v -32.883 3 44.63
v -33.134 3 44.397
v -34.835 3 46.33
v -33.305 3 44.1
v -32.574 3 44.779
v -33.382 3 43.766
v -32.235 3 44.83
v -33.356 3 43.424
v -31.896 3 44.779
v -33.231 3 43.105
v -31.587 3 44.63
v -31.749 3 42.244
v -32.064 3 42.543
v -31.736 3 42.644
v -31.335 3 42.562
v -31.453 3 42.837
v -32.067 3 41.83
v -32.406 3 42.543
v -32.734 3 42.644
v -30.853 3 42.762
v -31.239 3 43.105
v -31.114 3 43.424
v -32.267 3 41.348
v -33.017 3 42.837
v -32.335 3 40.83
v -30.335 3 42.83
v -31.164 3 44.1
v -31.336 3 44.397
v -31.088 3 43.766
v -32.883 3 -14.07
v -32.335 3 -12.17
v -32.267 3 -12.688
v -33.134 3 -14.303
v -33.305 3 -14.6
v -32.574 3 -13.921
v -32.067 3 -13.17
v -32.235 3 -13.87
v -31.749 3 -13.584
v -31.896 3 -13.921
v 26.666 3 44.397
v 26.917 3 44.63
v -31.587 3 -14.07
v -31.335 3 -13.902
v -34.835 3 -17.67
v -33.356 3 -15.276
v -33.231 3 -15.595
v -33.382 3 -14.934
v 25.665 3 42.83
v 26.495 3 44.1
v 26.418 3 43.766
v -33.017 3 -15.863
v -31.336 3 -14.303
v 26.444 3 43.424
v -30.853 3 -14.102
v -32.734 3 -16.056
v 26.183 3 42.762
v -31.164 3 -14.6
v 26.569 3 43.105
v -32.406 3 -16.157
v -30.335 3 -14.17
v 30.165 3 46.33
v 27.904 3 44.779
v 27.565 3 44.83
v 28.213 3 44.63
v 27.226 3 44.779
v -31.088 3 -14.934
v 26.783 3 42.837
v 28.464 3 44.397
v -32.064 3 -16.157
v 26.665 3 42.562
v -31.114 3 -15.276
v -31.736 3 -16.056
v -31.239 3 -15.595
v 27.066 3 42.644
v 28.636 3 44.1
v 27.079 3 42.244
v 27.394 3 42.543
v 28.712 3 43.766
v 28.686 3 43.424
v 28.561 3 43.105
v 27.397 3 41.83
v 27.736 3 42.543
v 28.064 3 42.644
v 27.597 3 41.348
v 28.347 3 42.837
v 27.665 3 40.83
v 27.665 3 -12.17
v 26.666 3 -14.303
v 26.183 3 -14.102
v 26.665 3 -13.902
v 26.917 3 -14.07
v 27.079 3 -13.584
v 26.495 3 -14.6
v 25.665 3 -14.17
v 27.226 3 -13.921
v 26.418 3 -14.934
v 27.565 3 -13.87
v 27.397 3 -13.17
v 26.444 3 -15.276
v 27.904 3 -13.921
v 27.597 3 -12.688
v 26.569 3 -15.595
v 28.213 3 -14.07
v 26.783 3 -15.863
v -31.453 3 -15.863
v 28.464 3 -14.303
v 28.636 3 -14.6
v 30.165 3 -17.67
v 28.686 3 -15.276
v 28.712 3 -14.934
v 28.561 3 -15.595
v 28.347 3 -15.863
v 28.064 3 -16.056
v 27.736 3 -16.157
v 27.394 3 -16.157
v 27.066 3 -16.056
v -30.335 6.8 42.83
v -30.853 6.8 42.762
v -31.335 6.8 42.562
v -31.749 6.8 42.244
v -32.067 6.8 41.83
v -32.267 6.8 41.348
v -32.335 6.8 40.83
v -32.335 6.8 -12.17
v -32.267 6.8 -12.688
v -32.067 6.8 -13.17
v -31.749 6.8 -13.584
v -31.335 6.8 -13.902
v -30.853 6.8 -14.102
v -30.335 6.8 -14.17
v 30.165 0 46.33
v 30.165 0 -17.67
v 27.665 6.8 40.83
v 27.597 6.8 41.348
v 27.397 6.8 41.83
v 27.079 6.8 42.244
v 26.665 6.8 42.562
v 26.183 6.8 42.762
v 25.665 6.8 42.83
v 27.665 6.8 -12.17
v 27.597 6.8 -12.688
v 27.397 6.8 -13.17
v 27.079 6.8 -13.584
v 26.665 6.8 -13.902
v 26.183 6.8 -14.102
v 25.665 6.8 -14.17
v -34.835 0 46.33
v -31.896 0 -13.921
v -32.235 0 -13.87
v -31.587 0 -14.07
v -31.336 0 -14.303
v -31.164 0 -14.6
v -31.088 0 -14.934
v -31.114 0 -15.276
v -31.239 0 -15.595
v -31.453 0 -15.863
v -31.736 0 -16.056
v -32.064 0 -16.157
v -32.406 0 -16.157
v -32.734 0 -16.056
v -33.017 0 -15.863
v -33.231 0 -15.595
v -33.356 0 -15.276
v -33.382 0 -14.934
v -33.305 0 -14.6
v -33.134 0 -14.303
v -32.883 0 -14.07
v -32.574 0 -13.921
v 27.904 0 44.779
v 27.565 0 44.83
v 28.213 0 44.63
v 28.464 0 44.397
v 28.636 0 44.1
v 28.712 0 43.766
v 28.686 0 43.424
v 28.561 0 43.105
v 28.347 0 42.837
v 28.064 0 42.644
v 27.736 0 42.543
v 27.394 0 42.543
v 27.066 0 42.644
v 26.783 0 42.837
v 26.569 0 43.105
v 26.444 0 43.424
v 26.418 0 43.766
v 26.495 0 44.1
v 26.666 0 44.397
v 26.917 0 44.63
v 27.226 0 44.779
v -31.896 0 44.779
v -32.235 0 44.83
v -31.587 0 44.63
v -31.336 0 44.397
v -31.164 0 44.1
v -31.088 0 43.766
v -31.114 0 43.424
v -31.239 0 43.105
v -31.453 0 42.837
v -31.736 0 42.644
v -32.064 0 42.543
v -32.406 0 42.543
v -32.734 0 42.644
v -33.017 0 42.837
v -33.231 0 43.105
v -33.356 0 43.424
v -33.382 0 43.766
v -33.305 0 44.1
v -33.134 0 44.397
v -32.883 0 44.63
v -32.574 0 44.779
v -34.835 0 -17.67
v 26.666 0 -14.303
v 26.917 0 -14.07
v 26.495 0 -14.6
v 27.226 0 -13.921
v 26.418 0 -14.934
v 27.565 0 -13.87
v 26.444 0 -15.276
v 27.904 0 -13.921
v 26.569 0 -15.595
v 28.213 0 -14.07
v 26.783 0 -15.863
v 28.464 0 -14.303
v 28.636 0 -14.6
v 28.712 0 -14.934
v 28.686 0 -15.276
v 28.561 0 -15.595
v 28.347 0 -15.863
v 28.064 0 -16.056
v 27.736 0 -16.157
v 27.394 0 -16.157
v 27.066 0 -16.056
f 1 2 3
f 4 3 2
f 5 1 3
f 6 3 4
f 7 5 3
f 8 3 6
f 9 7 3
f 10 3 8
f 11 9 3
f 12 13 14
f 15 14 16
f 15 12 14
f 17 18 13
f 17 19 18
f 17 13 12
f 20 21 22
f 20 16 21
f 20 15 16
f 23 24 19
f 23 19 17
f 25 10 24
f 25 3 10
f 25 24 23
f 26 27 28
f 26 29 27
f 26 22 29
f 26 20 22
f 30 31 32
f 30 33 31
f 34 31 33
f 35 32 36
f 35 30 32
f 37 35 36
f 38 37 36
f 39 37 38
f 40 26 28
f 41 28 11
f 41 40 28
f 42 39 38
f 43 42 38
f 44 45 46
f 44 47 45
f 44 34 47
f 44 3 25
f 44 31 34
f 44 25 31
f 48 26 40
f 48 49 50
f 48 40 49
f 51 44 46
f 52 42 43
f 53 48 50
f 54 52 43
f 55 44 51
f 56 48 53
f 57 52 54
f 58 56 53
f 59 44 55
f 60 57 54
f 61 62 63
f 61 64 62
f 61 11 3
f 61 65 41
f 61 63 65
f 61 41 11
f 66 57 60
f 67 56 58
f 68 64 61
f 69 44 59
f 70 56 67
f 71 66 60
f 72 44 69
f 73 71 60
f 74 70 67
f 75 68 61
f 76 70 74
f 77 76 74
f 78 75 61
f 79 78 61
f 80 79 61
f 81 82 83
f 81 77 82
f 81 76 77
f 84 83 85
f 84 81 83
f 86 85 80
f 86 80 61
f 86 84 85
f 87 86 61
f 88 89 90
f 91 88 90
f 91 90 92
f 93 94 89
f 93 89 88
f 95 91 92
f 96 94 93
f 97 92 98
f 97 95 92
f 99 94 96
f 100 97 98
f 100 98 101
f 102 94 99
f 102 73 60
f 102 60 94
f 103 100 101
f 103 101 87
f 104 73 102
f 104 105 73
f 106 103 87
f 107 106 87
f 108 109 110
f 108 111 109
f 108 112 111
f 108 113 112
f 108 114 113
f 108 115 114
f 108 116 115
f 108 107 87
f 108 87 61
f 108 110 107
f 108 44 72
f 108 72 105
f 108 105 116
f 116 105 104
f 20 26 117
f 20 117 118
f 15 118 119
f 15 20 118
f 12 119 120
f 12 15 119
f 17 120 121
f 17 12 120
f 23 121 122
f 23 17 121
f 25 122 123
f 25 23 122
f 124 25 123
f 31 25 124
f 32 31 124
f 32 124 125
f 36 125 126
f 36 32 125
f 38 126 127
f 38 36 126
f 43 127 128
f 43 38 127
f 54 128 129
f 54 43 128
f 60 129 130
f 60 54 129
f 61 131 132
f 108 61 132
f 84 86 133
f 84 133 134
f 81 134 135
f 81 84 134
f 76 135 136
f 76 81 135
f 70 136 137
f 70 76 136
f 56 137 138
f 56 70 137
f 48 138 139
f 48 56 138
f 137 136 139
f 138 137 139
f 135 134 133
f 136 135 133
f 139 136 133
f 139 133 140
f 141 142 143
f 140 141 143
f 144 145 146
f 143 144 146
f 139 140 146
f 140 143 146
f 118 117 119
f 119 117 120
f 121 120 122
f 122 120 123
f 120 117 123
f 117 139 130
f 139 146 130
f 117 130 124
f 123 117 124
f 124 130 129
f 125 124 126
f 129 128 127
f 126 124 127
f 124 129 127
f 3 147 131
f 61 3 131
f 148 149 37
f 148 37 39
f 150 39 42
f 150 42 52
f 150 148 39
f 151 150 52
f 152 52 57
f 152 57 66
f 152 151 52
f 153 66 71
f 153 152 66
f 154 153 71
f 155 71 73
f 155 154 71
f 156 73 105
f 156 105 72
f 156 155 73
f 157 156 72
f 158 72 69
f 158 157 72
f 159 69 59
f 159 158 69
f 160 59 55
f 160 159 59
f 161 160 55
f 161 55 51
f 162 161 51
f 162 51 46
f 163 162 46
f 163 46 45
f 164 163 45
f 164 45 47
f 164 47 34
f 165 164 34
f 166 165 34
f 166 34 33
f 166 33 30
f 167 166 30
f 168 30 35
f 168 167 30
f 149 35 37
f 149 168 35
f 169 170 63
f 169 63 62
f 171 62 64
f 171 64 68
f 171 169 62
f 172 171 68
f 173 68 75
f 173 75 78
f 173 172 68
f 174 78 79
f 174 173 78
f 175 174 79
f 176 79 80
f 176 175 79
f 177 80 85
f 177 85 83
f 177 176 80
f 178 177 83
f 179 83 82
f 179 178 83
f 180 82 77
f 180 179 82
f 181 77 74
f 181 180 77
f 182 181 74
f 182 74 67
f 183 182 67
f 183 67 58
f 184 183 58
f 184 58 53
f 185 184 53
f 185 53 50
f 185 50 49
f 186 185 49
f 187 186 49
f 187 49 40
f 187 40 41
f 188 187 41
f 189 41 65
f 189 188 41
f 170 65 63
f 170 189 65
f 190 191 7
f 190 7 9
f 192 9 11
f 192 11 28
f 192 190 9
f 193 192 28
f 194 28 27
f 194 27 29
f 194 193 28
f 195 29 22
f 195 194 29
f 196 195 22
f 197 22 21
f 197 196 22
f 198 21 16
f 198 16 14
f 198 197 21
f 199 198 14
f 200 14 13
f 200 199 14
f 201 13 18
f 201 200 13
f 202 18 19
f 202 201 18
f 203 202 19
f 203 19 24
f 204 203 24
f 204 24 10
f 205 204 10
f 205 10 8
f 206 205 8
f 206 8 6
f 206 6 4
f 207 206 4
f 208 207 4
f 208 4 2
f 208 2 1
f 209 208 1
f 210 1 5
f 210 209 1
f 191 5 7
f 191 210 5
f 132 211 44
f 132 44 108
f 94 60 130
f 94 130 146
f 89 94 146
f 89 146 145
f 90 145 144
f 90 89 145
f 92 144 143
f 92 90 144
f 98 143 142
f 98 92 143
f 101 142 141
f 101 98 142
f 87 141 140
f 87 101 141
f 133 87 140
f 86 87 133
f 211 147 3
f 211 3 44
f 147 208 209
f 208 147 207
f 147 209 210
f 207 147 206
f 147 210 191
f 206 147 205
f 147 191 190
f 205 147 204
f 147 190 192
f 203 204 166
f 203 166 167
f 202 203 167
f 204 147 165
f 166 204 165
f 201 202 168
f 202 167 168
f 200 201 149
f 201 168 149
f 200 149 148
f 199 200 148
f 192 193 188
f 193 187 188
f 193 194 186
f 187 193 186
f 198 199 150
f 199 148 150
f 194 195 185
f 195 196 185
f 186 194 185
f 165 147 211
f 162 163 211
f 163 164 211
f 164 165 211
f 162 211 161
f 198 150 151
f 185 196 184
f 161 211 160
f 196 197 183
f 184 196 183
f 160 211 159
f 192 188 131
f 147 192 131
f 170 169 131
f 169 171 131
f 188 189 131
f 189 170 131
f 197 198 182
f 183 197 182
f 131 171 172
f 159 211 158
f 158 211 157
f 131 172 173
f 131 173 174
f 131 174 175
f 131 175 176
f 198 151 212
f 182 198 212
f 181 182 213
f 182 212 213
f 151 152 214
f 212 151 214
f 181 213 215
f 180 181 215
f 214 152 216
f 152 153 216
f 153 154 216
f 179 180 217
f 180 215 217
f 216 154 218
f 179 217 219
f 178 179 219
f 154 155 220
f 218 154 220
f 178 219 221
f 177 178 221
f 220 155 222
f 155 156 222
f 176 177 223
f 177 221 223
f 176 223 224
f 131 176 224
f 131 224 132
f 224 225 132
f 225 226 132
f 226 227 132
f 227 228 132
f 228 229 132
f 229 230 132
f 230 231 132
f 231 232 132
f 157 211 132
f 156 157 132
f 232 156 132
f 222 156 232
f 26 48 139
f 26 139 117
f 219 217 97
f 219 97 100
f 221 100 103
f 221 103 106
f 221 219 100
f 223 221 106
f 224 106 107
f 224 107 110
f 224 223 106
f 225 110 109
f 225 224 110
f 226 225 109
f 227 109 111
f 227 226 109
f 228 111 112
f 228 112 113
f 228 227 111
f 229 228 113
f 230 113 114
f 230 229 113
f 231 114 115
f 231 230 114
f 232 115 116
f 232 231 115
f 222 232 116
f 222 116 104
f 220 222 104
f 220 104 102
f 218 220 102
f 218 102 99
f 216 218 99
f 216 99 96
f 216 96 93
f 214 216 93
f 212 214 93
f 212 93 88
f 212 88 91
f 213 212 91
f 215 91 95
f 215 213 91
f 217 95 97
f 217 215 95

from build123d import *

# Parameters (mm, degrees)
SKETCH1_W           = 65
SKETCH1_H           = 64
SKETCH1_R           = 1.15
BOSS_EXTRUDE1_DEPTH = 3
BOSS_EXTRUDE2_DEPTH = 3.8


with BuildPart() as part:
    # Sketch1 → Boss-Extrude1 (new body)
    with BuildSketch(Plane(origin=(0, 0, 0), x_dir=(1, 0, 0), z_dir=(0, 1, 0))):
        with Locations((-2.334951456, -14.330097087)):
            Rectangle(SKETCH1_W, SKETCH1_H)
        with Locations(Location((-32.234951456, 15.019902913, 0), (0, 0, 270))):
            Circle(SKETCH1_R, mode=Mode.SUBTRACT)
        with Locations(Location((27.565048544, 15.019902913, 0), (0, 0, 270))):
            Circle(SKETCH1_R, mode=Mode.SUBTRACT)
        with Locations(Location((-32.234951456, -43.680097087, 0), (0, 0, 270))):
            Circle(SKETCH1_R, mode=Mode.SUBTRACT)
        with Locations(Location((27.565048544, -43.680097087, 0), (0, 0, 270))):
            Circle(SKETCH1_R, mode=Mode.SUBTRACT)
    extrude(amount=BOSS_EXTRUDE1_DEPTH)

    # Sketch2 → Boss-Extrude2 (add)
    with BuildSketch(Plane(origin=(0, 3, 0), x_dir=(1, 0, 0), z_dir=(0, 1, 0))):
        with BuildLine():
            Line((-30.334951456, 14.169902913), (25.665048544, 14.169902913))
            ThreePointArc((25.665048544, 14.169902913), (27.079262106, 13.584116475), (27.665048544, 12.169902913))
            Line((27.665048544, 12.169902913), (27.665048544, -40.830097087))
            ThreePointArc((27.665048544, -40.830097087), (27.079262106, -42.24431065), (25.665048544, -42.830097087))
            Line((25.665048544, -42.830097087), (-30.334951456, -42.830097087))
            ThreePointArc((-30.334951456, -42.830097087), (-31.749165019, -42.24431065), (-32.334951456, -40.830097087))
            Line((-32.334951456, -40.830097087), (-32.334951456, 12.169902913))
            ThreePointArc((-32.334951456, 12.169902913), (-31.749165019, 13.584116475), (-30.334951456, 14.169902913))
        make_face()
    extrude(amount=BOSS_EXTRUDE2_DEPTH)


solid = part.part
